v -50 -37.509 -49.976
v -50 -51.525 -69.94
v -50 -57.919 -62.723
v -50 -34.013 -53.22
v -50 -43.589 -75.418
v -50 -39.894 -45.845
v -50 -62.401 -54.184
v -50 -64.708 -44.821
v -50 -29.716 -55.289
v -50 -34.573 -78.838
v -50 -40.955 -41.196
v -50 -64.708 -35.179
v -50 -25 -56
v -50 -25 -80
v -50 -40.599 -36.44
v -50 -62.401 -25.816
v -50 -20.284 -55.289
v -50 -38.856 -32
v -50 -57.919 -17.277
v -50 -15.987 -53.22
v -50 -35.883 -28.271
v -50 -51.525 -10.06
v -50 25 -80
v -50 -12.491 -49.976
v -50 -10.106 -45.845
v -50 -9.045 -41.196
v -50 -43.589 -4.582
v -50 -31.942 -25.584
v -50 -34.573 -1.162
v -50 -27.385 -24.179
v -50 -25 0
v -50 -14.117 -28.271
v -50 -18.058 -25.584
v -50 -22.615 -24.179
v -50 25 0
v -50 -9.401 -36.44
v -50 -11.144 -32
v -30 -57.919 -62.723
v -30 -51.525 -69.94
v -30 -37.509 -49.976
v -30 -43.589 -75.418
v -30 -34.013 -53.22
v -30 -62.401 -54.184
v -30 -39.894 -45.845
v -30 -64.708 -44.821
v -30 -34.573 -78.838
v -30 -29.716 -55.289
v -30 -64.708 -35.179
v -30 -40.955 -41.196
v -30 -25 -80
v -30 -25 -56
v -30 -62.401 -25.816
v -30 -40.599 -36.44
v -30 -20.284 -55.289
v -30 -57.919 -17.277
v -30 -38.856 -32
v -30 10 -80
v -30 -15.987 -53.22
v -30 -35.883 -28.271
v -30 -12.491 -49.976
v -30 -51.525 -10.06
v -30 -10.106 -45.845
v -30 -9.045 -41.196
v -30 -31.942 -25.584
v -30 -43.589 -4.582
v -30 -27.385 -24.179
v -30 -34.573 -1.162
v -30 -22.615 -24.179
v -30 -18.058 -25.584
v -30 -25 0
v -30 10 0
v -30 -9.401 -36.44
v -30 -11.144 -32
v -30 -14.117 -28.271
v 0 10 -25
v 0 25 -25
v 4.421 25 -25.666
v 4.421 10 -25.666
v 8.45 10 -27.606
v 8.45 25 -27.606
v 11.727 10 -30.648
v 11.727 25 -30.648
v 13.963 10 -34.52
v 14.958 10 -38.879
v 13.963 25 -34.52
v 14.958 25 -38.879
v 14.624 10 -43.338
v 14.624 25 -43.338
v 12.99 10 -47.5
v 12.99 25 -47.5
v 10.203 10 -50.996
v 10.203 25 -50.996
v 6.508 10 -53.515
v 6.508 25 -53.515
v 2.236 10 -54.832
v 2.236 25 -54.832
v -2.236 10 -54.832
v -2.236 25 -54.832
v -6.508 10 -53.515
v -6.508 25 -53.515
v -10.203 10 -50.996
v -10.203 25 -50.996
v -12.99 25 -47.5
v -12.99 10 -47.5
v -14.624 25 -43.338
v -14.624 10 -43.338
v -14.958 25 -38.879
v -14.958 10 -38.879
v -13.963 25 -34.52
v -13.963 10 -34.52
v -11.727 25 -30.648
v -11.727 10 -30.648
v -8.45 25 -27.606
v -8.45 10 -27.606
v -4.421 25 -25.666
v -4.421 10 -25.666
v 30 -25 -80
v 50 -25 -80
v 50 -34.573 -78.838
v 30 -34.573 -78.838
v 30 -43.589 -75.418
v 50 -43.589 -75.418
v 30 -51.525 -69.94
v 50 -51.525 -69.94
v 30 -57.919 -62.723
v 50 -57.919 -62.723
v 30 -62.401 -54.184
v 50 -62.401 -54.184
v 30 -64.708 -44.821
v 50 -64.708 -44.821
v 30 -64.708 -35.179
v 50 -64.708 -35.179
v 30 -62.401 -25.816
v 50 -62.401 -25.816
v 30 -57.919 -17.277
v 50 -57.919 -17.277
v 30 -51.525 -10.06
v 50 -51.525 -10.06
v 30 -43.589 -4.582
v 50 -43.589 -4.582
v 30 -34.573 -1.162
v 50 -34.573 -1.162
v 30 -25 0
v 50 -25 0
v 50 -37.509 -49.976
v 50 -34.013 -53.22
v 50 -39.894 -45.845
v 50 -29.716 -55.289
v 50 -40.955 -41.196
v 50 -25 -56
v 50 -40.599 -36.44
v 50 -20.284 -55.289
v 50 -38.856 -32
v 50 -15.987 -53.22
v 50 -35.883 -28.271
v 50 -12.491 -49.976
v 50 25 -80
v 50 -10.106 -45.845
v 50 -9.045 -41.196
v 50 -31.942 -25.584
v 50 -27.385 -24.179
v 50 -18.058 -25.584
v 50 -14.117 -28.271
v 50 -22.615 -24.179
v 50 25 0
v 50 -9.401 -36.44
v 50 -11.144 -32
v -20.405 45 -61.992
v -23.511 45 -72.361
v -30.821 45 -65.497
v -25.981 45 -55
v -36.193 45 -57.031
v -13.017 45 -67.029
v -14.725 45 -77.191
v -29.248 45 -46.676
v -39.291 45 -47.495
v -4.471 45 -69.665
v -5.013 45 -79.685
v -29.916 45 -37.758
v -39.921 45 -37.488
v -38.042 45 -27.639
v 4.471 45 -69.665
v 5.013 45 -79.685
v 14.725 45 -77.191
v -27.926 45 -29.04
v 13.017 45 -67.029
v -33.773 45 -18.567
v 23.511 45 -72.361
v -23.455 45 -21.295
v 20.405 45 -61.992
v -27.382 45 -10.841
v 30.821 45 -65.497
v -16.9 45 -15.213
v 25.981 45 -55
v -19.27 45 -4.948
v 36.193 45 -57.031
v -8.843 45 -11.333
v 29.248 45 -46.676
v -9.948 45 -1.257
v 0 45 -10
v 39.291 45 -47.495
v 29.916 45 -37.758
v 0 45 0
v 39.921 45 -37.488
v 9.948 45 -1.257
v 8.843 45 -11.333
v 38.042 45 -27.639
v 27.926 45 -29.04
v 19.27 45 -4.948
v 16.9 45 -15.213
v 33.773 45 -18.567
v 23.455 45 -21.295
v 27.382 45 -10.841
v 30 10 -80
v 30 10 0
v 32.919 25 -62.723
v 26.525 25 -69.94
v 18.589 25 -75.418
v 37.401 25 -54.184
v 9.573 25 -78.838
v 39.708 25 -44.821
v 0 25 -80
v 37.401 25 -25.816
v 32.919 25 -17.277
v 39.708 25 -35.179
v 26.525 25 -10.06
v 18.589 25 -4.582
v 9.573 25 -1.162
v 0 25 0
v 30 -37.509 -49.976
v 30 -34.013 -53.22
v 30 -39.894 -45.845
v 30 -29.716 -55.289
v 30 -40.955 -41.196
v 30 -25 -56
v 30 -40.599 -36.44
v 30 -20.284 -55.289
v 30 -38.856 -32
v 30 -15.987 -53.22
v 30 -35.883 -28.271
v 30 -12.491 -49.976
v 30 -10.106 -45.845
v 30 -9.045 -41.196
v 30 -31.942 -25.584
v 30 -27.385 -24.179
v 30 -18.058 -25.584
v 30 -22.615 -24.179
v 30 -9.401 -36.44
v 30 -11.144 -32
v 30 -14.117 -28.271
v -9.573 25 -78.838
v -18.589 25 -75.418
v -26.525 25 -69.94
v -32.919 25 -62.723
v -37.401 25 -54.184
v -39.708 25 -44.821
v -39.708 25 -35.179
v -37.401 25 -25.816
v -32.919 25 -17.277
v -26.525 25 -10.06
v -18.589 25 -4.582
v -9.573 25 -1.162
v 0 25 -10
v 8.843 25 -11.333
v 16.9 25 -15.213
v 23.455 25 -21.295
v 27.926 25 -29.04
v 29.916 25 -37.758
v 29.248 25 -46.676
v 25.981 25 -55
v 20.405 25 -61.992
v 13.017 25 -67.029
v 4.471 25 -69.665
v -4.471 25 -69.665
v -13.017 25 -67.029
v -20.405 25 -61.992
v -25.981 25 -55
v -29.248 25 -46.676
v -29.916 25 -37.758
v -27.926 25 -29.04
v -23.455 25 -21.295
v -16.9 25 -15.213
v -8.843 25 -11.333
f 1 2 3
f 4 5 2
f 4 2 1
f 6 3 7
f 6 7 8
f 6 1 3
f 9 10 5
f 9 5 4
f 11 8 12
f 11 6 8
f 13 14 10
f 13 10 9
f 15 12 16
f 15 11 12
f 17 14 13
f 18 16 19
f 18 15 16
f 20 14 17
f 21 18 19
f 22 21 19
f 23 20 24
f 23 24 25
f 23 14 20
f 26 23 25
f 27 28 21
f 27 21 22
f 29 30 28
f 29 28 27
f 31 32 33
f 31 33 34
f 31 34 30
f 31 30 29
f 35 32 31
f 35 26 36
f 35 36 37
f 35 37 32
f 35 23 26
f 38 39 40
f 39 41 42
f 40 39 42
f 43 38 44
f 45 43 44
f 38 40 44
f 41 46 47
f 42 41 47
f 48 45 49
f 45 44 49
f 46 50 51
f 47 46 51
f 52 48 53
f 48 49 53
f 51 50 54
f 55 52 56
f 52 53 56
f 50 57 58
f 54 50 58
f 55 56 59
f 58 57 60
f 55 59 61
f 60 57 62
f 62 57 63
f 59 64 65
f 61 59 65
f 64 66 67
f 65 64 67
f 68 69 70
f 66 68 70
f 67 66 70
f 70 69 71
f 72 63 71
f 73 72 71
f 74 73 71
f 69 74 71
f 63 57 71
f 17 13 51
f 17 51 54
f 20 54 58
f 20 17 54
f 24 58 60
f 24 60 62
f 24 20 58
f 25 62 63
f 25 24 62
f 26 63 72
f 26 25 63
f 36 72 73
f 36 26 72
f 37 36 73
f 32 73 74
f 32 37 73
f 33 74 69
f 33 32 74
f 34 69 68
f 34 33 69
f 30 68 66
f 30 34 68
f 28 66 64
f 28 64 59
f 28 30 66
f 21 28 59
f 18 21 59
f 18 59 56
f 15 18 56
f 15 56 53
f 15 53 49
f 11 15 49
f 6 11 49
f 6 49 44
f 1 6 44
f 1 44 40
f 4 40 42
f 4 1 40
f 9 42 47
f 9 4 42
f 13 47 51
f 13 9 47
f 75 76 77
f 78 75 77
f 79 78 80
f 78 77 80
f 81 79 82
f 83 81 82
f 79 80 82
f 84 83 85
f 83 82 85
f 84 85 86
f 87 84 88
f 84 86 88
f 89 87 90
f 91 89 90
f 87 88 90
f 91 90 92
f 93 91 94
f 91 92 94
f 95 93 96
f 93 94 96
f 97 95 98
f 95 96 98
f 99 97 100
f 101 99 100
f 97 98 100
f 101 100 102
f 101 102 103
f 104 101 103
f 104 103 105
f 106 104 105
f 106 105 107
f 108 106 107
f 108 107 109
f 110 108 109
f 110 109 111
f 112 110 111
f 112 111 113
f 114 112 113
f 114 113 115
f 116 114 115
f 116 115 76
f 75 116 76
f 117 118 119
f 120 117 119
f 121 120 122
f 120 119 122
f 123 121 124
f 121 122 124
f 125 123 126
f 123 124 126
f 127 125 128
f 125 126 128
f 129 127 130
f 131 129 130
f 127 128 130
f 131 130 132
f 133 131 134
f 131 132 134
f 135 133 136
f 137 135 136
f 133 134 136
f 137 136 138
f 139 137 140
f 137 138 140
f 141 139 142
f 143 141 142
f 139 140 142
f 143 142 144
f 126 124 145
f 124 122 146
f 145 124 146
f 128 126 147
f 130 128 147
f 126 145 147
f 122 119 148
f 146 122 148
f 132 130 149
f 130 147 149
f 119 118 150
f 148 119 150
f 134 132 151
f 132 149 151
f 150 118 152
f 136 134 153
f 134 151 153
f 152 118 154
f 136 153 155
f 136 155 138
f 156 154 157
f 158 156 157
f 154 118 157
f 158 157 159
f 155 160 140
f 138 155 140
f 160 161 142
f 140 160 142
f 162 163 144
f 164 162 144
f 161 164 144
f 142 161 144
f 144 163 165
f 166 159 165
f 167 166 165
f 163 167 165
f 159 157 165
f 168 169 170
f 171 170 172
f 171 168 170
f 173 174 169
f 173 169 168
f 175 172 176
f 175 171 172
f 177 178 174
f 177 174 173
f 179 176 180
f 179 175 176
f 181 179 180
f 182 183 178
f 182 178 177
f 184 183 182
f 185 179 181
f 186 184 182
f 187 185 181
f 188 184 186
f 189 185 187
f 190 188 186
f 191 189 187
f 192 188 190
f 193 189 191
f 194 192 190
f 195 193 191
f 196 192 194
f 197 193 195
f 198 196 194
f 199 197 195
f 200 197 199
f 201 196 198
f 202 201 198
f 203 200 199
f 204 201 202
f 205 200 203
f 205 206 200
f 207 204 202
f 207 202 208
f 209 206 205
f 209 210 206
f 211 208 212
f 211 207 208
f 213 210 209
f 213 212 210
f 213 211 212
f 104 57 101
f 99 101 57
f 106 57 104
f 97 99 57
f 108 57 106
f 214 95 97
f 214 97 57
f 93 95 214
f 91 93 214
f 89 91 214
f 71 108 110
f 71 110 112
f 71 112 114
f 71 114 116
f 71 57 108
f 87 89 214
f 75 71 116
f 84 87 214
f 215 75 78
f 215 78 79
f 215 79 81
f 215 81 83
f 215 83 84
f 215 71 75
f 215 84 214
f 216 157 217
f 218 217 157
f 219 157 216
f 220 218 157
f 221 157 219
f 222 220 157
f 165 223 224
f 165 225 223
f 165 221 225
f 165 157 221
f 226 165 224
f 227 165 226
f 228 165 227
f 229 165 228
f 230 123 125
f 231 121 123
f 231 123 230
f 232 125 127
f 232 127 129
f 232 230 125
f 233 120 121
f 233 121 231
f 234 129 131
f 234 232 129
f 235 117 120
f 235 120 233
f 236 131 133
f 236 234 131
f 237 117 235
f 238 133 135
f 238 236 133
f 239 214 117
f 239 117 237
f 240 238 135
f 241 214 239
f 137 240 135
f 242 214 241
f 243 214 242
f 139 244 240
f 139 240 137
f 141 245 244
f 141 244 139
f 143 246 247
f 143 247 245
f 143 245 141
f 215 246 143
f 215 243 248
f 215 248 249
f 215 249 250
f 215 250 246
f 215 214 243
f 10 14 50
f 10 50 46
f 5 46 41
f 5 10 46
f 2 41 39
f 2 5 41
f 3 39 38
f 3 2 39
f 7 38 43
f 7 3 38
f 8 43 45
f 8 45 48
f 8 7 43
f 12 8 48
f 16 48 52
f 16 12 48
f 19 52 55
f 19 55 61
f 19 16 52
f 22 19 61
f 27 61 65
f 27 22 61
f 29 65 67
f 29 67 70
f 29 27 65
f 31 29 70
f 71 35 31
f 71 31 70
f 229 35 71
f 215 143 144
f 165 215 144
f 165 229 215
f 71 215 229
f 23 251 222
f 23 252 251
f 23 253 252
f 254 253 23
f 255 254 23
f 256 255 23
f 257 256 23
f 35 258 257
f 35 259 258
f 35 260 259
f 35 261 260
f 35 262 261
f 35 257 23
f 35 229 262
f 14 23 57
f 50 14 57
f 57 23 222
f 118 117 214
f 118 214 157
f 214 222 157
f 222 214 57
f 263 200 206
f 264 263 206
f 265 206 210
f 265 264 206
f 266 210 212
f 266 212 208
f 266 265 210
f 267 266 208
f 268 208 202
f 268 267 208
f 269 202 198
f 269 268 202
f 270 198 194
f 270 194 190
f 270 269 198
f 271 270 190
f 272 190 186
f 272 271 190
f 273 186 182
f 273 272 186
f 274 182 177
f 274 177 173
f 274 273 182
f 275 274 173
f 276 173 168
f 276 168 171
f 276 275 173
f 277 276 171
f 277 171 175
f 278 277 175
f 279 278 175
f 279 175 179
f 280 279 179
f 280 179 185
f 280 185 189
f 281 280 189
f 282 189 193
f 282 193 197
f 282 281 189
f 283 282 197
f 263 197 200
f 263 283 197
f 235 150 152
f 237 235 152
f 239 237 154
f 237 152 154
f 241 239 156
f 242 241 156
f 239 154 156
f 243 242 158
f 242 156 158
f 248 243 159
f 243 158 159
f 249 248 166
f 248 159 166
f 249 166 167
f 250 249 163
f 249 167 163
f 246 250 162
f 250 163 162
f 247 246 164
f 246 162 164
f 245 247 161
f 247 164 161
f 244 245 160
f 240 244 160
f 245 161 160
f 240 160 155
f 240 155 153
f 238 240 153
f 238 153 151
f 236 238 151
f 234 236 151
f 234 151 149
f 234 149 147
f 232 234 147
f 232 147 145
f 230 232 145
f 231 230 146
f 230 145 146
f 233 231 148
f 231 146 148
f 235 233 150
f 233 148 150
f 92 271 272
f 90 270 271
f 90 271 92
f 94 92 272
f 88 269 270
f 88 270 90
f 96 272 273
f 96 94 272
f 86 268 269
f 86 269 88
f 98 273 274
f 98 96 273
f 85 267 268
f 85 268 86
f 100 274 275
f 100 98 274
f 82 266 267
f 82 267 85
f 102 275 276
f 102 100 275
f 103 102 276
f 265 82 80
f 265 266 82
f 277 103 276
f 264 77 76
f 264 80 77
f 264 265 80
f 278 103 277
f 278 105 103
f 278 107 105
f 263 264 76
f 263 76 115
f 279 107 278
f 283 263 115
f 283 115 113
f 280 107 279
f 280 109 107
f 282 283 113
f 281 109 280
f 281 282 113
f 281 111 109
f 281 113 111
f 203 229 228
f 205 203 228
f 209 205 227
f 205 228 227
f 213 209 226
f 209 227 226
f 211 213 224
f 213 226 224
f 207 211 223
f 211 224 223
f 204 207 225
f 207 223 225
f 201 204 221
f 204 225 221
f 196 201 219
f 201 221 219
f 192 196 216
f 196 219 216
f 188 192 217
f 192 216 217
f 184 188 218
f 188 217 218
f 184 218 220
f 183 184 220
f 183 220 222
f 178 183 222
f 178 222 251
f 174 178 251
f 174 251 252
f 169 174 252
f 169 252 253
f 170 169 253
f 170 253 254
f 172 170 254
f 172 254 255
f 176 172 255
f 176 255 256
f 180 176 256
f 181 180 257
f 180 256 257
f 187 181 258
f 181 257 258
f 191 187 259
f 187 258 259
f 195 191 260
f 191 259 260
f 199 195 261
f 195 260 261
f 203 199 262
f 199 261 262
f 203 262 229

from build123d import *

# Parameters (mm, degrees)
BOSS_EXTRUDE1_DEPTH = 80
BOSS_EXTRUDE2_DEPTH = 20
SKETCH3_R           = 16
CUT_EXTRUDE1_DEPTH  = 20
SKETCH4_R           = 40
SKETCH4_R_2         = 30
BOSS_EXTRUDE3_DEPTH = 20
SKETCH5_R           = 15
CUT_EXTRUDE2_DEPTH  = 131.384048104


with BuildPart() as part:
    # Sketch1 → Boss-Extrude1 (new body)
    with BuildSketch(Plane.XY):
        Polygon((30, -25), (50, -25), (50, 25), (-50, 25), (-50, -25), (-30, -25), (-30, 10), (30, 10), align=None)
    extrude(amount=-BOSS_EXTRUDE1_DEPTH)

    # Sketch2 → Boss-Extrude2 (add)
    with BuildSketch(Plane(origin=(50, 0, 0), x_dir=(0, 0, -1), z_dir=(1, 0, 0))):
        with BuildLine():
            Line((0, -25), (80, -25))
            ThreePointArc((80, -25), (40, -65), (0, -25))
        make_face()
    boss_extrude2 = extrude(amount=-BOSS_EXTRUDE2_DEPTH)

    # Sketch3 → Cut-Extrude1 (cut)
    with BuildSketch(Plane(origin=(50, 0, 0), x_dir=(0, 0, -1), z_dir=(1, 0, 0))):
        with Locations((40, -25)):
            Circle(SKETCH3_R)
    cut_extrude1 = extrude(amount=-CUT_EXTRUDE1_DEPTH, mode=Mode.SUBTRACT)

    # Mirror1: Boss-Extrude2, Cut-Extrude1 across plane
    add(boss_extrude2.mirror(Plane(origin=(0, 0, 0), x_dir=(0, 0, 1), z_dir=(1, 0, 0))))
    add(cut_extrude1.mirror(Plane(origin=(0, 0, 0), x_dir=(0, 0, 1), z_dir=(1, 0, 0))), mode=Mode.SUBTRACT)

    # Sketch4 → Boss-Extrude3 (add)
    with BuildSketch(Plane(origin=(0, 25, 0), x_dir=(1, 0, 0), z_dir=(0, 1, 0))):
        with Locations(Location((0, 40, 0), (0, 0, 270))):
            Circle(SKETCH4_R)
        with Locations(Location((0, 40, 0), (0, 0, 270))):
            Circle(SKETCH4_R_2, mode=Mode.SUBTRACT)
    extrude(amount=BOSS_EXTRUDE3_DEPTH)

    # Sketch5 → Cut-Extrude2 (cut, through all)
    with BuildSketch(Plane(origin=(0, 25, 0), x_dir=(1, 0, 0), z_dir=(0, 1, 0))):
        with Locations(Location((0, 40, 0), (0, 0, 270))):
            Circle(SKETCH5_R)
    extrude(amount=-CUT_EXTRUDE2_DEPTH, mode=Mode.SUBTRACT)


solid = part.part
